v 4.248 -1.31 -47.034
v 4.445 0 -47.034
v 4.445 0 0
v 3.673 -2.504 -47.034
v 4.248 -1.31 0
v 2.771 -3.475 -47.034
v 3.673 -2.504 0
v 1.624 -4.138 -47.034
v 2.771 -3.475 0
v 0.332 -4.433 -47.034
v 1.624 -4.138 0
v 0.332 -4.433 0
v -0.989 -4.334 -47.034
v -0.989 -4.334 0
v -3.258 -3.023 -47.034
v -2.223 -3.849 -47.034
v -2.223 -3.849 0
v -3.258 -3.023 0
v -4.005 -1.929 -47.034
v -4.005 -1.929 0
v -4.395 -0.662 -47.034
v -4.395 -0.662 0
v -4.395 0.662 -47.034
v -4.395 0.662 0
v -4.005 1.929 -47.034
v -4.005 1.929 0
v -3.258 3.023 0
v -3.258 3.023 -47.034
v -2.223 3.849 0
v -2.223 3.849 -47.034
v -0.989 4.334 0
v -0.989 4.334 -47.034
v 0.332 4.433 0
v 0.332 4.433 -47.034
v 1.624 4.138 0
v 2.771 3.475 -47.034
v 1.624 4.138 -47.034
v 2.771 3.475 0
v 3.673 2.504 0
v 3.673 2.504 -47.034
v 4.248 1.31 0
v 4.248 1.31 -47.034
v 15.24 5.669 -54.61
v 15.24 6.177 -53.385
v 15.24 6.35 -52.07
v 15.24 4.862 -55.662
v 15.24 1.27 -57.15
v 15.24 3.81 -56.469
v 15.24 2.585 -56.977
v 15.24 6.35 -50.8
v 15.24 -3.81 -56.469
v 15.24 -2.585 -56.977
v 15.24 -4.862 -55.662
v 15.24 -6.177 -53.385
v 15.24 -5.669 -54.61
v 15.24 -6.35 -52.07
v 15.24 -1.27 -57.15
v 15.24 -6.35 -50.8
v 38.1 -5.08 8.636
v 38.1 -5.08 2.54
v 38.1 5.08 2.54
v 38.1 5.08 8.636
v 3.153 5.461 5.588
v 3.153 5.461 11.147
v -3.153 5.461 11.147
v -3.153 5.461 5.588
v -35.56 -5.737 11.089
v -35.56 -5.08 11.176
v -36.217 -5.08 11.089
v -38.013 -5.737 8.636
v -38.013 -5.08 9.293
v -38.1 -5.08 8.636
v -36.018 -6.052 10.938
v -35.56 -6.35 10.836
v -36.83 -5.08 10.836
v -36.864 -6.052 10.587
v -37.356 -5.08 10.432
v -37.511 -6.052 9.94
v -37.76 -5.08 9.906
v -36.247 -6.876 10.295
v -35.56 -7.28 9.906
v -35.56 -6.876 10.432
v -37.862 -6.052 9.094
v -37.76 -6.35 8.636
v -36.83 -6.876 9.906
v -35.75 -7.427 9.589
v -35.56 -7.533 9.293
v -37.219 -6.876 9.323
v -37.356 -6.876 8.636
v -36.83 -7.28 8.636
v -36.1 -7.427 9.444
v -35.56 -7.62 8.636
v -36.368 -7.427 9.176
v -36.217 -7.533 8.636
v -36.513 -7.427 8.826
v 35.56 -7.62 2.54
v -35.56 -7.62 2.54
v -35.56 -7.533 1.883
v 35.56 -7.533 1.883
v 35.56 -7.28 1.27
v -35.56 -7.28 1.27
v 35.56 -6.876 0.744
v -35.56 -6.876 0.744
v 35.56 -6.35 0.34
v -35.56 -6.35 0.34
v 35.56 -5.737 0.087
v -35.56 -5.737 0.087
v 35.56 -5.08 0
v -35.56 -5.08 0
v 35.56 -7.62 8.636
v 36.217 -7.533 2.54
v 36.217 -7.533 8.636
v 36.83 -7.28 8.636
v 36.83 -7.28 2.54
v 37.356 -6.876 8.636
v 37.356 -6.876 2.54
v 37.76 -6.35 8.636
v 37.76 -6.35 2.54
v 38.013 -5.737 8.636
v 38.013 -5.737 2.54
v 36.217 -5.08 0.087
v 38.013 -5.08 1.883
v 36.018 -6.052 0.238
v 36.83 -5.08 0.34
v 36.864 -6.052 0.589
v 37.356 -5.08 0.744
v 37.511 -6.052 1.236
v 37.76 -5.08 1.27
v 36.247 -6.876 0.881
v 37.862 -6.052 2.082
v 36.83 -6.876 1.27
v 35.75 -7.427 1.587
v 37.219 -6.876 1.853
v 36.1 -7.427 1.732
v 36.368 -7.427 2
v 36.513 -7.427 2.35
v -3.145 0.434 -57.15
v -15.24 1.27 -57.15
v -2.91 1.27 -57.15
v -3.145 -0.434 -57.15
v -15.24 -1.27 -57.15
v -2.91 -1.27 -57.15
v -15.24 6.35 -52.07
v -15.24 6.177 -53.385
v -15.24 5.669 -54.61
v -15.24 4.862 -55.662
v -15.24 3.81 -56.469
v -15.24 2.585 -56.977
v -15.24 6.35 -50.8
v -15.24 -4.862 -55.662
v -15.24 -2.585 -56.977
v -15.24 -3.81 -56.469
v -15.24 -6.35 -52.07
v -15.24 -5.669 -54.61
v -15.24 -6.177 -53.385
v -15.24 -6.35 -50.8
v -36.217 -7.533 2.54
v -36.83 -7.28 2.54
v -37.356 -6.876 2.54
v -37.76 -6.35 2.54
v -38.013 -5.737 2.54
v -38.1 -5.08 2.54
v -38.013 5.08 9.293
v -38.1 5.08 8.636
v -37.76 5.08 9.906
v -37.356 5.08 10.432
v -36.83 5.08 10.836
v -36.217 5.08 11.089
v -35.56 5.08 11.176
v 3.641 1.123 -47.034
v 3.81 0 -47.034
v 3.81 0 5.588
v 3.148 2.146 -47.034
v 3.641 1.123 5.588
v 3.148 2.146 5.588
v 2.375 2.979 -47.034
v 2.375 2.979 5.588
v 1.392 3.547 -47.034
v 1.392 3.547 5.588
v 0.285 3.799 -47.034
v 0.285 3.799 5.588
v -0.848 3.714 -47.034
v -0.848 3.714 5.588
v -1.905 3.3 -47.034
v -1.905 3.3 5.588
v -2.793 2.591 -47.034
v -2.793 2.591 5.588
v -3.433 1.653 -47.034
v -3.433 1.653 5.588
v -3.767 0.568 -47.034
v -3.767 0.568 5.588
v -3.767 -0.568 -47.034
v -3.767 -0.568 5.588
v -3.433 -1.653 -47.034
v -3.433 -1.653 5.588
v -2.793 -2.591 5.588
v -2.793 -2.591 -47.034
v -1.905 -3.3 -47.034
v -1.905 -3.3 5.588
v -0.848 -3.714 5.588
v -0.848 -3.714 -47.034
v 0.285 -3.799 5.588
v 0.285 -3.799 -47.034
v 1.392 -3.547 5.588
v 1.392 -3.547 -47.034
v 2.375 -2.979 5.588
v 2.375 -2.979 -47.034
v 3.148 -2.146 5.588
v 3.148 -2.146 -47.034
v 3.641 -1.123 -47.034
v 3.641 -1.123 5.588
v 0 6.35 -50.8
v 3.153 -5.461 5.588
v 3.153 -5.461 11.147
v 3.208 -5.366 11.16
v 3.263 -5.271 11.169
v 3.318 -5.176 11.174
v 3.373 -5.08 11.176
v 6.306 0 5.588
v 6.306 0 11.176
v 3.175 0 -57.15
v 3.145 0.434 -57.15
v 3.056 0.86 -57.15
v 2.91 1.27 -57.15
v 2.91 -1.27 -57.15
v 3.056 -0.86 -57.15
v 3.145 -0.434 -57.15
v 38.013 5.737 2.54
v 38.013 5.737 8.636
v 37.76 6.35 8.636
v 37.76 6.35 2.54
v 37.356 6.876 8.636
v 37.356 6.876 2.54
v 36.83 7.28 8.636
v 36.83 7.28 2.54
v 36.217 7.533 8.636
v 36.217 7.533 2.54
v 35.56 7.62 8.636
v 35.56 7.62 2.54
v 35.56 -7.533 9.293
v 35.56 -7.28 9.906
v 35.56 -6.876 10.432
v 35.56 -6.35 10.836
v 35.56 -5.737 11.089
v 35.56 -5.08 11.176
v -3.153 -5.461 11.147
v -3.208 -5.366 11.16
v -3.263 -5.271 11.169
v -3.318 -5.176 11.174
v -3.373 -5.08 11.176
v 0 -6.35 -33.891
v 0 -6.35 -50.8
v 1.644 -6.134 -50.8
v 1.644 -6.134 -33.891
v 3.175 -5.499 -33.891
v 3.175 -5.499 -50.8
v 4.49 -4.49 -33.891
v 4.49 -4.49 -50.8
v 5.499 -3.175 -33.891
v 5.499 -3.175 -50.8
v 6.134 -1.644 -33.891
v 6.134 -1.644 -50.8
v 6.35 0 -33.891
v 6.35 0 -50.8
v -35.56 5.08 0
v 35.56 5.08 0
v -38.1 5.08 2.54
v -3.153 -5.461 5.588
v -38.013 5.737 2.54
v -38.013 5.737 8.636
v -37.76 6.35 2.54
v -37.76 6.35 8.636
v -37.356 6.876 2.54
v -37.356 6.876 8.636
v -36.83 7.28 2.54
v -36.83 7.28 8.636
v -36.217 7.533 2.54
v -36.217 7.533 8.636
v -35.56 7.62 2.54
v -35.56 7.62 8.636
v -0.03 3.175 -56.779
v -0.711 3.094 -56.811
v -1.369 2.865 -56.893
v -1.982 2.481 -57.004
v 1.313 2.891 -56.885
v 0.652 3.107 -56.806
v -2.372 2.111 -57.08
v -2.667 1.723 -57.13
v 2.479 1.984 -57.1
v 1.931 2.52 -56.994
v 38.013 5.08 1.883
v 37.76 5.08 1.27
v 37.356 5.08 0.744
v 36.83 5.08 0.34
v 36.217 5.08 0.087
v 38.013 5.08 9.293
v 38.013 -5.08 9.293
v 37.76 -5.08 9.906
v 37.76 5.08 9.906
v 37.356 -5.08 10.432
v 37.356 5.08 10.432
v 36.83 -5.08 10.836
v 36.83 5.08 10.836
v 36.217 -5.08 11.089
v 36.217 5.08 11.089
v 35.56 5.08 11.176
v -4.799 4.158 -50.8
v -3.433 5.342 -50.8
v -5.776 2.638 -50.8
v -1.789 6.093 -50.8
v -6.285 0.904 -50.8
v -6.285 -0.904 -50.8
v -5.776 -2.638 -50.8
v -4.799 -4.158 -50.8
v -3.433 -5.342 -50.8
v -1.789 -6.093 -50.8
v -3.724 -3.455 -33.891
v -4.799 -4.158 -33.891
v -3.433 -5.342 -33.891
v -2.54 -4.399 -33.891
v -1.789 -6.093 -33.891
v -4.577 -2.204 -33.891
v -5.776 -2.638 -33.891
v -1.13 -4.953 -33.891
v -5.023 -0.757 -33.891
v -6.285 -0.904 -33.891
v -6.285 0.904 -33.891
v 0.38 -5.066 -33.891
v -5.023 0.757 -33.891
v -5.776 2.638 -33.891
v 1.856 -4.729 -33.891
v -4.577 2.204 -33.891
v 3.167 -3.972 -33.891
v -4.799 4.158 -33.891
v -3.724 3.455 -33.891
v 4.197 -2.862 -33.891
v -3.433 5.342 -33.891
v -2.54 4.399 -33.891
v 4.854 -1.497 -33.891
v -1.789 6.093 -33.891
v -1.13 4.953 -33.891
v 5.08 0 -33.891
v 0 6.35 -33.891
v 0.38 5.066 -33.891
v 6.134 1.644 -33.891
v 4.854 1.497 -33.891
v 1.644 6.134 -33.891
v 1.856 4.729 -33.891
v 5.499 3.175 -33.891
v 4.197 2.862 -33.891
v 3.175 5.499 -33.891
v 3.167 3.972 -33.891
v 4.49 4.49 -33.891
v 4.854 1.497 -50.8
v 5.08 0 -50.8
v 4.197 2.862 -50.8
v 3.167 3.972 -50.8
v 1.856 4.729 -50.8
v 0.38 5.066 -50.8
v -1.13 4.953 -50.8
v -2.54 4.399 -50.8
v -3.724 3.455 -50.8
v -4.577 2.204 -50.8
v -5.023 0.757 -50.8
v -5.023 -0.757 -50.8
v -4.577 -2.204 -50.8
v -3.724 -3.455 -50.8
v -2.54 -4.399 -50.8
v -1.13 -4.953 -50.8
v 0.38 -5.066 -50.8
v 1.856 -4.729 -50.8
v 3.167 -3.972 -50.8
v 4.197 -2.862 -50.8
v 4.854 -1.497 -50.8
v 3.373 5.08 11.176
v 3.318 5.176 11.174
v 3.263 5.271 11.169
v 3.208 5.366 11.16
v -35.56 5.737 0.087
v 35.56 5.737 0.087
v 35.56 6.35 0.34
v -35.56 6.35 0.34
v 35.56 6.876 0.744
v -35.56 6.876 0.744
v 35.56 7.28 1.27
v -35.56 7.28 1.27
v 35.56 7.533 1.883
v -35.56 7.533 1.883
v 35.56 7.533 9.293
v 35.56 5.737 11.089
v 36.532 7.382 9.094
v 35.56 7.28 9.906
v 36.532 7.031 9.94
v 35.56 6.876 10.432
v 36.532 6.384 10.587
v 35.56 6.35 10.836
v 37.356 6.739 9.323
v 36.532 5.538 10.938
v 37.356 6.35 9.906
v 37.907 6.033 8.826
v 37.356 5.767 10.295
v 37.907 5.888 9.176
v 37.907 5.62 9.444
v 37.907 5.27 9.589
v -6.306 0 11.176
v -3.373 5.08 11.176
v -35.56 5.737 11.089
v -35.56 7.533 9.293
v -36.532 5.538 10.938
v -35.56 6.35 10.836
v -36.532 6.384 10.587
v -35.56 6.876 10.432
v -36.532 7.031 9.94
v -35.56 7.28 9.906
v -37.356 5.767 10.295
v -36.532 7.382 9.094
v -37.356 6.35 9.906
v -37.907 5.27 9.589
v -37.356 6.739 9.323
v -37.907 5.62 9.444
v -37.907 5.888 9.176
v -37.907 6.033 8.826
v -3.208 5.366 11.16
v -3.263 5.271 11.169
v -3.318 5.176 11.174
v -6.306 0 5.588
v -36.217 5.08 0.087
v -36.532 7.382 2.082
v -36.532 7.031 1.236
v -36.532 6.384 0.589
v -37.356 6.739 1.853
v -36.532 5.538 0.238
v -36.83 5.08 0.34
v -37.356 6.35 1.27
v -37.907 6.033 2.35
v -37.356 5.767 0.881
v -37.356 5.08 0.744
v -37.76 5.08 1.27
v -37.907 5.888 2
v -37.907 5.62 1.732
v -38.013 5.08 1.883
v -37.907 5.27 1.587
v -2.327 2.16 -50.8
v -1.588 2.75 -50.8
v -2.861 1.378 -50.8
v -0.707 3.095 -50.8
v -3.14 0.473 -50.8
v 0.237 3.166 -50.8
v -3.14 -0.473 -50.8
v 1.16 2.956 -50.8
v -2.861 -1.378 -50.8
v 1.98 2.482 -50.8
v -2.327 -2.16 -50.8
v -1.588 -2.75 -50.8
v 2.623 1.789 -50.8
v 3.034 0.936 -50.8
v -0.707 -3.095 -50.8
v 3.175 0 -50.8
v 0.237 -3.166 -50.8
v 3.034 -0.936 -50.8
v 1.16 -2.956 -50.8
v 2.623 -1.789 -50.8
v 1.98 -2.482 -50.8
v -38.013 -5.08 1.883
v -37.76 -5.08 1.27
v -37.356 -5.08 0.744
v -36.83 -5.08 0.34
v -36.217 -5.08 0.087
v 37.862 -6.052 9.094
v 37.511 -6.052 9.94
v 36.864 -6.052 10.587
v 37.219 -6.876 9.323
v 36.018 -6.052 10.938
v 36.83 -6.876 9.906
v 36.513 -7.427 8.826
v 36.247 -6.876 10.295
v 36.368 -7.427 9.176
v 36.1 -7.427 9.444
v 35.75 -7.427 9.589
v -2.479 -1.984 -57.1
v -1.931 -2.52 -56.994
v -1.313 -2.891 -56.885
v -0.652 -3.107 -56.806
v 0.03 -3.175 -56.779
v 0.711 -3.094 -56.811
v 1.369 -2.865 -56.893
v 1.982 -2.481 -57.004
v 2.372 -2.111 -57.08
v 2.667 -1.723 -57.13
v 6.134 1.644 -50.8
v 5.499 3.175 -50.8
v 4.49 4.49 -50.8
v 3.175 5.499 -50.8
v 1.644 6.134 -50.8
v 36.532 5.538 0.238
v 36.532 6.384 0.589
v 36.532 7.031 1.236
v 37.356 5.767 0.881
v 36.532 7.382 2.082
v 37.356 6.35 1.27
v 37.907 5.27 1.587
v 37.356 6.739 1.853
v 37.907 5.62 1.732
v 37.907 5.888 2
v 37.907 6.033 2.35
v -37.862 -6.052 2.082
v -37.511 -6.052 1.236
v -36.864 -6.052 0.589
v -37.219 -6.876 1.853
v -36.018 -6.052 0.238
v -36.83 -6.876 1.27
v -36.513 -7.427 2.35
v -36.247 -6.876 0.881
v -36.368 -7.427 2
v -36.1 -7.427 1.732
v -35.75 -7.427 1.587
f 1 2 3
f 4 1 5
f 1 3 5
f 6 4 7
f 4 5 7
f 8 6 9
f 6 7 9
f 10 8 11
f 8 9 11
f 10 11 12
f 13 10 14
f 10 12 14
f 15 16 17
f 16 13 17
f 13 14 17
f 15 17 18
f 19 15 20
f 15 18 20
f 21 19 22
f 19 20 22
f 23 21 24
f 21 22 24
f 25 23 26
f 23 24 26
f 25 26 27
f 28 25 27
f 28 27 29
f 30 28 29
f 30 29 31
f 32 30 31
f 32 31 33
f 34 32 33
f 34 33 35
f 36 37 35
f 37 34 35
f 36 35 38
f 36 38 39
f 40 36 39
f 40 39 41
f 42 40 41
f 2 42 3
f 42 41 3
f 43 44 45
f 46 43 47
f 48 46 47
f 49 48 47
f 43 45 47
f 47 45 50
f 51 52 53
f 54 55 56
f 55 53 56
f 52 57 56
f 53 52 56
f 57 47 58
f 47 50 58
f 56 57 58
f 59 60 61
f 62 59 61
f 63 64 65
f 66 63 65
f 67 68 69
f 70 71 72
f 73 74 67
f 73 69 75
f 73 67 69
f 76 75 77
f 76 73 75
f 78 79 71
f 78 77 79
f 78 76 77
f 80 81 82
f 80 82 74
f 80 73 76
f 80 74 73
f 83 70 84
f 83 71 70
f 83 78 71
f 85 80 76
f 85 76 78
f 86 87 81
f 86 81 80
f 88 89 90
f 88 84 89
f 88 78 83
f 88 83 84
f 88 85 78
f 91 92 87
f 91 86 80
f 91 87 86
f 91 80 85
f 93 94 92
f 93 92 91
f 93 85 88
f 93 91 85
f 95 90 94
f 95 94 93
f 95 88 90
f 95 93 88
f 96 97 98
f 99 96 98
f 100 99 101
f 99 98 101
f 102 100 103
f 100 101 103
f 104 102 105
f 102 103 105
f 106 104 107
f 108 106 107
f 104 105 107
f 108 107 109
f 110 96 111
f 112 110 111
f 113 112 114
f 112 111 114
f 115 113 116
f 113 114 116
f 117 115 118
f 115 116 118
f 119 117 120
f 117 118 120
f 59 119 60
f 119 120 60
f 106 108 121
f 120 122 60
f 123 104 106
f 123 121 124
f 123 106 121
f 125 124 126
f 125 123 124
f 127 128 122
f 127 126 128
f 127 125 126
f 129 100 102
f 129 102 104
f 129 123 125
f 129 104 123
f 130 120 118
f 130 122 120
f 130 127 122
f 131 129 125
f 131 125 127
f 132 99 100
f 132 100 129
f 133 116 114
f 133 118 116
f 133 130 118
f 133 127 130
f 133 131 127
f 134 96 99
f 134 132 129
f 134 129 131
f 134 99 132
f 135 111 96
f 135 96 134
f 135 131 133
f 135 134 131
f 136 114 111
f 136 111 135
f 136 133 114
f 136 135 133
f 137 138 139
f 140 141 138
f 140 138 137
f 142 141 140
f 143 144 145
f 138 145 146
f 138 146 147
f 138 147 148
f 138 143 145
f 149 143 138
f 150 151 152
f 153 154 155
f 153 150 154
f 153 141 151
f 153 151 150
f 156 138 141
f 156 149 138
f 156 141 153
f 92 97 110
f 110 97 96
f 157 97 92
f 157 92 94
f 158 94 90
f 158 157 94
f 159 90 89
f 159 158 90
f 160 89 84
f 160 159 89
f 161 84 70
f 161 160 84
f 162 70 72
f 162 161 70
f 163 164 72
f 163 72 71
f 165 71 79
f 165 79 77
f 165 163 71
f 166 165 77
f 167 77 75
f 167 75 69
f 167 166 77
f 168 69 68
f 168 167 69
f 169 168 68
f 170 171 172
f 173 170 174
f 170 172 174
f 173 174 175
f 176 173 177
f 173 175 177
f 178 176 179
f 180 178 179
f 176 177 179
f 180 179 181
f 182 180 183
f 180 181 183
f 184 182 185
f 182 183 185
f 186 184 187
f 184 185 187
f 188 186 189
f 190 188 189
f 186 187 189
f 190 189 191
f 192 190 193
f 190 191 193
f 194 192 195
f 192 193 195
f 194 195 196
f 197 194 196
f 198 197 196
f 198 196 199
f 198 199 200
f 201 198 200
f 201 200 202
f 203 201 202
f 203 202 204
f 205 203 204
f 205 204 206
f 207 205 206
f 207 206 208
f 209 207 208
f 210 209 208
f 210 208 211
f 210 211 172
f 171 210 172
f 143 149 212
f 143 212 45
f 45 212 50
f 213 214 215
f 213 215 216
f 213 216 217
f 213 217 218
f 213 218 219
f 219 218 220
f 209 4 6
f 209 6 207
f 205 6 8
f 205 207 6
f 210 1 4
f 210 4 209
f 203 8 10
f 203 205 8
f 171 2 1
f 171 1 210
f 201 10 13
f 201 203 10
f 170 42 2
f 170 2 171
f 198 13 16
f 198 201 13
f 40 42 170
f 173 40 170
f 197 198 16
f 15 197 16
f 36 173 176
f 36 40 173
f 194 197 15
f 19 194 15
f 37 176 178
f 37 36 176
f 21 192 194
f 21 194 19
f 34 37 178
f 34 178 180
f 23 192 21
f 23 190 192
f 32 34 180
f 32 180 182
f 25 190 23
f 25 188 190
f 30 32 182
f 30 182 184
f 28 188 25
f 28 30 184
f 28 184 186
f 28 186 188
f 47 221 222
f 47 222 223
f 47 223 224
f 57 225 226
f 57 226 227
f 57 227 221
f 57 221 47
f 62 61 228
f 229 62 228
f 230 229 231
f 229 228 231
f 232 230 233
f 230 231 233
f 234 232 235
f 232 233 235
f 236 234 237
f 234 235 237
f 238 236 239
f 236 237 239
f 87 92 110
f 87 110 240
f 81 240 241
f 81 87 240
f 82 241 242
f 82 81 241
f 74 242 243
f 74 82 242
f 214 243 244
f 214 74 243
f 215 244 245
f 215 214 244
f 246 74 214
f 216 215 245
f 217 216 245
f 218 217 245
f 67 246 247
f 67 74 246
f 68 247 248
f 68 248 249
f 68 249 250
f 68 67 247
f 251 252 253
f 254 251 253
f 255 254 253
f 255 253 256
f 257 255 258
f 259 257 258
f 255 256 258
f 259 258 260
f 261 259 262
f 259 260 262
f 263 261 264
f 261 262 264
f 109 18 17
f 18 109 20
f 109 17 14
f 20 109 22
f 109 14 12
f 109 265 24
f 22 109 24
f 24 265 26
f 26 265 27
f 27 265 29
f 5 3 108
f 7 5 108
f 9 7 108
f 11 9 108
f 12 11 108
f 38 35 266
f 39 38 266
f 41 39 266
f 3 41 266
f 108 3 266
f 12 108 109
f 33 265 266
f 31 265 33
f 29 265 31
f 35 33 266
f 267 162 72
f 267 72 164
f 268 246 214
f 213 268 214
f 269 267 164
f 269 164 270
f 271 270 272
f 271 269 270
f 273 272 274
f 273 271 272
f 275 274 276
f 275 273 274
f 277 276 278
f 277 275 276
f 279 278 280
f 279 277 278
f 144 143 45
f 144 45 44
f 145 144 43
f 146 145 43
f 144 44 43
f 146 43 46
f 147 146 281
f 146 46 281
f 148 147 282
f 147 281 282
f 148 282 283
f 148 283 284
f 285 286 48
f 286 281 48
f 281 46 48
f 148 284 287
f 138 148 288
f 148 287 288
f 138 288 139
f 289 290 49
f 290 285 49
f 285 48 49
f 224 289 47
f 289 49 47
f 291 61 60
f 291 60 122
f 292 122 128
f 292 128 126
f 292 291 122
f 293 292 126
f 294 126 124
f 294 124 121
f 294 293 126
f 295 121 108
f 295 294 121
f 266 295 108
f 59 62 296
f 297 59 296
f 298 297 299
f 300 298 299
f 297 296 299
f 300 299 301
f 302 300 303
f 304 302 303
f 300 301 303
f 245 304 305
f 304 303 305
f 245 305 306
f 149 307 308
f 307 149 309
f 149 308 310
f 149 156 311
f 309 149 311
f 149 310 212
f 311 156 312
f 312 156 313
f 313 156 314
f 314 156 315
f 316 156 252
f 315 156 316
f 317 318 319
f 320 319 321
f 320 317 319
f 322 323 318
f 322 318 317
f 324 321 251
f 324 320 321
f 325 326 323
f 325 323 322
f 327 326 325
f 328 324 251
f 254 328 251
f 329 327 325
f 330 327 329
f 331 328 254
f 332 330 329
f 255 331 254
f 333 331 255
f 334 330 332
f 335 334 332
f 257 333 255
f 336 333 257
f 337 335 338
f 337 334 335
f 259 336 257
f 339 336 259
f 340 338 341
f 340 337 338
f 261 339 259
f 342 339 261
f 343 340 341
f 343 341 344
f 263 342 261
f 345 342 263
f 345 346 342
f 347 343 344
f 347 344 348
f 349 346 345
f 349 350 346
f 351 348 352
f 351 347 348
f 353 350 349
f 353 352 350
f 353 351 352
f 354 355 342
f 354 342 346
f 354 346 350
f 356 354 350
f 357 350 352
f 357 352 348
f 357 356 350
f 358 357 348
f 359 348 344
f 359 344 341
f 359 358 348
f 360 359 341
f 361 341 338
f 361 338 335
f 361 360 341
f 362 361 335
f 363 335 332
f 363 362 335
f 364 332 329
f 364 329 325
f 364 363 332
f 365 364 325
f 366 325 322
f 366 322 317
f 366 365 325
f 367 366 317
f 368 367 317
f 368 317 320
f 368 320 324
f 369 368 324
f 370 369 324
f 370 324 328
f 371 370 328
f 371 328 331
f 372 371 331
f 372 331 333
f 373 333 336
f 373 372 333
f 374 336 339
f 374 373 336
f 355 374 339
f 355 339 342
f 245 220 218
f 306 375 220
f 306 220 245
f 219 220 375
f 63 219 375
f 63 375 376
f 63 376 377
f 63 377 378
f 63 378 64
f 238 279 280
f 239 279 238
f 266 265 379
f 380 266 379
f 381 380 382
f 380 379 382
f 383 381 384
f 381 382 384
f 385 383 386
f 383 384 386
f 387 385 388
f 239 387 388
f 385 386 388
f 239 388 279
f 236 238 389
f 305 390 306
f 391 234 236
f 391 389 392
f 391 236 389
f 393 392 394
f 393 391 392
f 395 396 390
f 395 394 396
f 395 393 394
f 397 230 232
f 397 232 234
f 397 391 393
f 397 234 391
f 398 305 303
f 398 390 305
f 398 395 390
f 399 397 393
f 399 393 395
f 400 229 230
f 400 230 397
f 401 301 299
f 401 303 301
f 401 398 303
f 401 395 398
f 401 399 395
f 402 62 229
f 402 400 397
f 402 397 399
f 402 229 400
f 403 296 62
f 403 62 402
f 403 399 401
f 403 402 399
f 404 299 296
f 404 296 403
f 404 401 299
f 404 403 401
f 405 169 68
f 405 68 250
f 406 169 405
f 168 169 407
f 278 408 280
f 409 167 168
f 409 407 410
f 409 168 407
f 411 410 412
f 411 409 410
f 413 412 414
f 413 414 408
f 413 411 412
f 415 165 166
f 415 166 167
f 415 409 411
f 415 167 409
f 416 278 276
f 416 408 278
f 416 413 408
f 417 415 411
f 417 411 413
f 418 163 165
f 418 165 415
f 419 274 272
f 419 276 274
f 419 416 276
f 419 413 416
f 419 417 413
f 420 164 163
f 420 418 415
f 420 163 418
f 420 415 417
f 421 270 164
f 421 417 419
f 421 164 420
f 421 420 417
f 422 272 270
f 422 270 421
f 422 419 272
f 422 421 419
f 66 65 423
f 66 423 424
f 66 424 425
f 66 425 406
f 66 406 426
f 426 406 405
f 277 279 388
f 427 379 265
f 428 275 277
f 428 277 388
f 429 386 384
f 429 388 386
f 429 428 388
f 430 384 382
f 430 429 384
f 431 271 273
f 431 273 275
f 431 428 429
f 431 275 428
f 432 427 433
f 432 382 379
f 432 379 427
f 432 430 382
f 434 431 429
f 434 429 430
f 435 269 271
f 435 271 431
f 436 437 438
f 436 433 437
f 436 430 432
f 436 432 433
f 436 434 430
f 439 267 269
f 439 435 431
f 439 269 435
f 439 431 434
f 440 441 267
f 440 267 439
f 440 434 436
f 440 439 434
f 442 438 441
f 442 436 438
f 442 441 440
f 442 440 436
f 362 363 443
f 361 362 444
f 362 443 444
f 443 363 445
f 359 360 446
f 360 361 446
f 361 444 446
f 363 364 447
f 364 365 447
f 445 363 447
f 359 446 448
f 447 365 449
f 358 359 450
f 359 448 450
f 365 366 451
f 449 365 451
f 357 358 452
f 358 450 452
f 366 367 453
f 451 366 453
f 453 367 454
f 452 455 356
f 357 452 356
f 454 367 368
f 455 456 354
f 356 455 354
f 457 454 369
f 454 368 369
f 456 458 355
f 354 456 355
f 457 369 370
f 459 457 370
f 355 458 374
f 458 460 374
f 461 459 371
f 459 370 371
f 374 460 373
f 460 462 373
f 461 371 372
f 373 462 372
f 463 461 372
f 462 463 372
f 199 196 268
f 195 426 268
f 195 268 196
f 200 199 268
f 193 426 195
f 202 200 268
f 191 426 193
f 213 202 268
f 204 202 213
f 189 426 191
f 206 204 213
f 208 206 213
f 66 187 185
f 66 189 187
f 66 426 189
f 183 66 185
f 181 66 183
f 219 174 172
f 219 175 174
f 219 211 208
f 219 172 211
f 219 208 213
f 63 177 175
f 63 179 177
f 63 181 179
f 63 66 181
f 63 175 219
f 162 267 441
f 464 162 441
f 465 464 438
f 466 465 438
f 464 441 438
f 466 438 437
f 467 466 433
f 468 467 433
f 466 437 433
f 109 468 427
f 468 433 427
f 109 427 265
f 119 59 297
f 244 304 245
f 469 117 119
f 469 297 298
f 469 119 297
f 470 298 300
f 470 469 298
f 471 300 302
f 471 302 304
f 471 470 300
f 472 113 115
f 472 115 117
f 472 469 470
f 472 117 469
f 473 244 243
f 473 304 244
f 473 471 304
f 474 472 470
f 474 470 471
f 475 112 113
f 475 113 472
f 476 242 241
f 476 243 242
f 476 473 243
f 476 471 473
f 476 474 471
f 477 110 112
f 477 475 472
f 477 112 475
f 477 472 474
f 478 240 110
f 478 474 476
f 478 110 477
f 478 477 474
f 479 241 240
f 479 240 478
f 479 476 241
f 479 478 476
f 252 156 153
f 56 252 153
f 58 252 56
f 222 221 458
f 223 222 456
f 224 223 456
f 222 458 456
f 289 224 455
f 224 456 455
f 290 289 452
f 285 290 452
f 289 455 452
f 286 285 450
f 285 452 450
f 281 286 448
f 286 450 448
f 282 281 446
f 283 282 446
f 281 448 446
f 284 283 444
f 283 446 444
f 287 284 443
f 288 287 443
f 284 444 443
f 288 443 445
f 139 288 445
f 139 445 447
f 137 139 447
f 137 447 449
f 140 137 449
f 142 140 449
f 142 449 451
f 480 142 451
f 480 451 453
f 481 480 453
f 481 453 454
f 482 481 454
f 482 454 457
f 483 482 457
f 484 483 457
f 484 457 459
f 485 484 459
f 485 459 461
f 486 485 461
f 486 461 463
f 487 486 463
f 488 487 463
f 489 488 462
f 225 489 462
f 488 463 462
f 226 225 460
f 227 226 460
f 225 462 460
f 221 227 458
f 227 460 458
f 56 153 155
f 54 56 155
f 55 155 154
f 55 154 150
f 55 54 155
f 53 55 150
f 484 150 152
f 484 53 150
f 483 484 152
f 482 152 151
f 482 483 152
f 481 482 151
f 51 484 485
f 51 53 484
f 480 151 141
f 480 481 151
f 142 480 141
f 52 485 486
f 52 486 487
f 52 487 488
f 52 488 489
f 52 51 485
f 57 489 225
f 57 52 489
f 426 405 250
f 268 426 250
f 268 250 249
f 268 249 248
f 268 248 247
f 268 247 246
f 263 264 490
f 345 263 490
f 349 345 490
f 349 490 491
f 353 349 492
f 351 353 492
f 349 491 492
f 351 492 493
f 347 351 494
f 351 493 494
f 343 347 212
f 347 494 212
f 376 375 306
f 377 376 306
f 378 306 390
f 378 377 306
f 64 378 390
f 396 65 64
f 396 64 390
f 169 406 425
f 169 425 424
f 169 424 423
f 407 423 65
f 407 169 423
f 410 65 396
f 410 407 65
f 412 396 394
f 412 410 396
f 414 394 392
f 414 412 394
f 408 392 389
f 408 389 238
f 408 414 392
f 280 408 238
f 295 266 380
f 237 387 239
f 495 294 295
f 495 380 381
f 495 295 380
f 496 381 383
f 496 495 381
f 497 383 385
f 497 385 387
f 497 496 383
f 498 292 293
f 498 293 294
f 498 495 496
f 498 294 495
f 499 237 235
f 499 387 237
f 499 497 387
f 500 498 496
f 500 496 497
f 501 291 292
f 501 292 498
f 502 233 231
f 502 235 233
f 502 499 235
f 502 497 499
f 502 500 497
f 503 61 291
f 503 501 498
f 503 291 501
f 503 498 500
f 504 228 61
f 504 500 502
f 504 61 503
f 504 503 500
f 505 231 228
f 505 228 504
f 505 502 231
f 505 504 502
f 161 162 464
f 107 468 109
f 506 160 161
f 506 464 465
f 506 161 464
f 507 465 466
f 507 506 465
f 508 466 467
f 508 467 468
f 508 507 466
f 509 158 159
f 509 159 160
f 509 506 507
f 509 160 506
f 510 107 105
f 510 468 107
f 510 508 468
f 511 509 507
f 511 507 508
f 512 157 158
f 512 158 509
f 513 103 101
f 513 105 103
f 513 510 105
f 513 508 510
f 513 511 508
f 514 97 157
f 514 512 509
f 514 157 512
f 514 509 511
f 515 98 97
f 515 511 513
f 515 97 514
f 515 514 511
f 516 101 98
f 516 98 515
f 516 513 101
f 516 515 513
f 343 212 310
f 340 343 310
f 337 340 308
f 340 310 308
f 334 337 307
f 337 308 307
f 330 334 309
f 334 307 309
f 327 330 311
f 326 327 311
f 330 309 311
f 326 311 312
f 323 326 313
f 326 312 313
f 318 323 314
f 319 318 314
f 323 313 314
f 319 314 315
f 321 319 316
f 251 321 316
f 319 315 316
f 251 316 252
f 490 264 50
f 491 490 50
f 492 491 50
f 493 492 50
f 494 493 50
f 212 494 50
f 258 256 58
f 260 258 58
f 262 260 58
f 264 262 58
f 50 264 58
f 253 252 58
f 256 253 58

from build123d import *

# Parameters (mm, degrees)
F0_W         = 76.2
F0_H         = 15.24
F1_DEPTH     = 11.176
F4_DEPTH     = 5.588
F5_R         = 3.175
F6_DEPTH     = 11.176
F7_T1_DEPTH  = 6.096
F7_T3_DEPTH  = 10.16
F7_T5_DEPTH  = 71.12
F7_S9_W      = 2.54
F7_S9_H      = 2.54
F7_T10_DEPTH = 2.54
F7_S15_W     = 2.54
F7_S15_H     = 2.54
F7_T16_DEPTH = 2.54
F7_S21_W     = 2.54
F7_S21_H     = 2.54
F7_T22_DEPTH = 2.54
F7_S27_W     = 2.54
F7_S27_H     = 2.54
F7_T28_DEPTH = 2.54
F7_S33_W     = 2.54
F7_S33_H     = 2.54
F7_T34_DEPTH = 2.54
F7_S39_W     = 2.54
F7_S39_H     = 2.54
F7_T40_DEPTH = 2.54
F7_S45_W     = 2.54
F7_S45_H     = 2.54
F7_T46_DEPTH = 2.54
F7_S51_W     = 2.54
F7_S51_H     = 2.54
F7_T52_DEPTH = 2.54
F8_R         = 4.445
F9_DEPTH     = 50.8
F10_R        = 3.175
F11_DEPTH    = 61.976
F12_W        = 30.48
F12_H        = 12.7
F13_DEPTH    = 6.35
F14_R        = 5.08
F15_R        = 3.175
F16_DEPTH    = 71.6058239341
F17_W        = 9.715013206
F17_H        = 3.7662244022
F18_DEPTH    = 16.9285498559
F20_R        = 5.08
F21_DEPTH    = 16.9094242156
F22_R        = 3.81
F23_DEPTH    = 111.593618989


# Not quite as in the source:
# - a fillet or chamfer that OpenCascade refuses, or shapes differently, is made with other operations: its cross-section is extruded or revolved along the edge and cut away or added


with BuildPart() as f1:
    # F0 (on Top) → F1 (new body)
    with BuildSketch(Plane.XY):
        Rectangle(F0_W, F0_H)
    extrude(amount=F1_DEPTH)

    # F3 (on face) → F4 (cut)
    with BuildSketch(Plane.XY.offset(11.176)):
        Polygon((-3.15290982, -5.461), (3.15290982, -5.461), (6.3058196401, 0), (3.15290982, 5.461), (-3.15290982, 5.461), (-6.3058196401, 0), align=None)
    extrude(amount=-F4_DEPTH, mode=Mode.SUBTRACT)

    # F5 (on face) → F6 (cut)
    with BuildSketch(Plane.XY.offset(11.176)):
        Circle(F5_R)
    extrude(amount=-F6_DEPTH, mode=Mode.SUBTRACT)

    # F7: fillet of radius 2.54 on 12 edges, made by hand

    # F7_s2 → F7_t1 (cut)
    with BuildSketch(Plane.XY.offset(2.54)):
        with BuildLine():
            ThreePointArc((-35.56, -7.62), (-37.3560512242, -6.8760512242), (-38.1, -5.08))
            Line((-38.1, -5.08), (-38.1, -7.62))
            Line((-38.1, -7.62), (-35.56, -7.62))
        make_face()
        with BuildLine():
            ThreePointArc((-38.1, 5.08), (-37.3560512242, 6.8760512242), (-35.56, 7.62))
            Line((-35.56, 7.62), (-38.1, 7.62))
            Line((-38.1, 7.62), (-38.1, 5.08))
        make_face()
        with BuildLine():
            ThreePointArc((38.1, 5.08), (37.3560512242, 6.8760512242), (35.56, 7.62))
            Line((35.56, 7.62), (38.1, 7.62))
            Line((38.1, 7.62), (38.1, 5.08))
        make_face()
        with BuildLine():
            ThreePointArc((35.56, -7.62), (37.3560512242, -6.8760512242), (38.1, -5.08))
            Line((38.1, -5.08), (38.1, -7.62))
            Line((38.1, -7.62), (35.56, -7.62))
        make_face()
    extrude(amount=F7_T1_DEPTH, mode=Mode.SUBTRACT)

    # F7_s4 → F7_t3 (cut)
    with BuildSketch(Plane.XZ.offset(-5.08)):
        with BuildLine():
            ThreePointArc((38.1, 2.54), (37.3560512242, 0.7439487758), (35.56, 0))
            Line((35.56, 0), (38.1, 0))
            Line((38.1, 0), (38.1, 2.54))
        make_face()
        with BuildLine():
            ThreePointArc((-38.1, 8.636), (-37.3560512242, 10.4320512242), (-35.56, 11.176))
            Line((-35.56, 11.176), (-38.1, 11.176))
            Line((-38.1, 11.176), (-38.1, 8.636))
        make_face()
        with BuildLine():
            ThreePointArc((-38.1, 2.54), (-37.3560512242, 0.7439487758), (-35.56, 0))
            Line((-35.56, 0), (-38.1, 0))
            Line((-38.1, 0), (-38.1, 2.54))
        make_face()
        with BuildLine():
            ThreePointArc((38.1, 8.636), (37.3560512242, 10.4320512242), (35.56, 11.176))
            Line((35.56, 11.176), (38.1, 11.176))
            Line((38.1, 11.176), (38.1, 8.636))
        make_face()
    extrude(amount=F7_T3_DEPTH, mode=Mode.SUBTRACT)

    # F7_s6 → F7_t5 (cut)
    with BuildSketch(Plane.YZ.offset(-35.56)):
        with BuildLine():
            ThreePointArc((5.08, 11.176), (6.8760512242, 10.4320512242), (7.62, 8.636))
            Line((7.62, 8.636), (7.62, 11.176))
            Line((7.62, 11.176), (5.08, 11.176))
        make_face()
        with BuildLine():
            ThreePointArc((5.08, 0), (6.8760512242, 0.7439487758), (7.62, 2.54))
            Line((7.62, 2.54), (7.62, 0))
            Line((7.62, 0), (5.08, 0))
        make_face()
        with BuildLine():
            ThreePointArc((-7.62, 2.54), (-6.8760512242, 0.7439487758), (-5.08, 0))
            Line((-5.08, 0), (-7.62, 0))
            Line((-7.62, 0), (-7.62, 2.54))
        make_face()
        with BuildLine():
            ThreePointArc((-7.62, 8.636), (-6.8760512242, 10.4320512242), (-5.08, 11.176))
            Line((-5.08, 11.176), (-7.62, 11.176))
            Line((-7.62, 11.176), (-7.62, 8.636))
        make_face()
    extrude(amount=F7_T5_DEPTH, mode=Mode.SUBTRACT)


with BuildPart() as f7_tool8:
    # F7_s9 → F7_t10 (new body)
    with BuildSketch(Plane.XZ.offset(5.08)):
        with Locations((-36.83, 1.27)):
            Rectangle(F7_S9_W, F7_S9_H)
    extrude(amount=F7_T10_DEPTH)

    # F7_s11 → F7_t12 (revolve, cut)
    with BuildSketch(Plane(origin=(-35.56, -5.08, 2.54), x_dir=(0.7071067812, 0, 0.7071067812), z_dir=(0.7071067812, 0, -0.7071067812))):
        with BuildLine():
            ThreePointArc((0, -2.54), (2.54, 0), (0, 2.54))
            Line((0, 2.54), (0, -2.54))
        make_face()
    revolve(axis=Axis((-35.56, -5.08, 2.54), (0, -1, 0)), mode=Mode.SUBTRACT)


with BuildPart() as f1_1:
    add(f1.part)

    # F7_t7: cut F7_tool8
    add(f7_tool8.part, mode=Mode.SUBTRACT)


with BuildPart() as f7_tool14:
    # F7_s15 → F7_t16 (new body)
    with BuildSketch(Plane.XZ.offset(5.08)):
        with Locations((-36.83, 9.906)):
            Rectangle(F7_S15_W, F7_S15_H)
    extrude(amount=F7_T16_DEPTH)

    # F7_s17 → F7_t18 (revolve, cut)
    with BuildSketch(Plane(origin=(-35.56, -5.08, 8.636), x_dir=(0.7071067812, 0, -0.7071067812), z_dir=(-0.7071067812, 0, -0.7071067812))):
        with BuildLine():
            ThreePointArc((0, -2.54), (2.54, 0), (0, 2.54))
            Line((0, 2.54), (0, -2.54))
        make_face()
    revolve(axis=Axis((-35.56, -5.08, 8.636), (0, -1, 0)), mode=Mode.SUBTRACT)


with BuildPart() as f1_2:
    add(f1_1.part)

    # F7_t13: cut F7_tool14
    add(f7_tool14.part, mode=Mode.SUBTRACT)


with BuildPart() as f7_tool20:
    # F7_s21 → F7_t22 (new body)
    with BuildSketch(Plane.YZ.offset(-35.56)):
        with Locations((6.35, 1.27)):
            Rectangle(F7_S21_W, F7_S21_H)
    extrude(amount=-F7_T22_DEPTH)

    # F7_s23 → F7_t24 (revolve, cut)
    with BuildSketch(Plane(origin=(-35.56, 5.08, 2.54), x_dir=(0, -0.7071067812, 0.7071067812), z_dir=(0, -0.7071067812, -0.7071067812))):
        with BuildLine():
            ThreePointArc((0, -2.54), (2.54, 0), (0, 2.54))
            Line((0, 2.54), (0, -2.54))
        make_face()
    revolve(axis=Axis((-35.56, 5.08, 2.54), (-1, 0, 0)), mode=Mode.SUBTRACT)


with BuildPart() as f1_3:
    add(f1_2.part)

    # F7_t19: cut F7_tool20
    add(f7_tool20.part, mode=Mode.SUBTRACT)


with BuildPart() as f7_tool26:
    # F7_s27 → F7_t28 (new body)
    with BuildSketch(Plane.YZ.offset(-35.56)):
        with Locations((6.35, 9.906)):
            Rectangle(F7_S27_W, F7_S27_H)
    extrude(amount=-F7_T28_DEPTH)

    # F7_s29 → F7_t30 (revolve, cut)
    with BuildSketch(Plane(origin=(-35.56, 5.08, 8.636), x_dir=(0, -0.7071067812, -0.7071067812), z_dir=(0, 0.7071067812, -0.7071067812))):
        with BuildLine():
            ThreePointArc((0, -2.54), (2.54, 0), (0, 2.54))
            Line((0, 2.54), (0, -2.54))
        make_face()
    revolve(axis=Axis((-35.56, 5.08, 8.636), (-1, 0, 0)), mode=Mode.SUBTRACT)


with BuildPart() as f1_4:
    add(f1_3.part)

    # F7_t25: cut F7_tool26
    add(f7_tool26.part, mode=Mode.SUBTRACT)


with BuildPart() as f7_tool32:
    # F7_s33 → F7_t34 (new body)
    with BuildSketch(Plane.XZ.offset(5.08)):
        with Locations((36.83, 1.27)):
            Rectangle(F7_S33_W, F7_S33_H)
    extrude(amount=F7_T34_DEPTH)

    # F7_s35 → F7_t36 (revolve, cut)
    with BuildSketch(Plane(origin=(35.56, -5.08, 2.54), x_dir=(-0.7071067812, 0, 0.7071067812), z_dir=(0.7071067812, 0, 0.7071067812))):
        with BuildLine():
            ThreePointArc((0, -2.54), (2.54, 0), (0, 2.54))
            Line((0, 2.54), (0, -2.54))
        make_face()
    revolve(axis=Axis((35.56, -5.08, 2.54), (0, -1, 0)), mode=Mode.SUBTRACT)


with BuildPart() as f1_5:
    add(f1_4.part)

    # F7_t31: cut F7_tool32
    add(f7_tool32.part, mode=Mode.SUBTRACT)


with BuildPart() as f7_tool38:
    # F7_s39 → F7_t40 (new body)
    with BuildSketch(Plane.YZ.offset(35.56)):
        with Locations((6.35, 1.27)):
            Rectangle(F7_S39_W, F7_S39_H)
    extrude(amount=F7_T40_DEPTH)

    # F7_s41 → F7_t42 (revolve, cut)
    with BuildSketch(Plane(origin=(35.56, 5.08, 2.54), x_dir=(0, -0.7071067812, 0.7071067812), z_dir=(0, 0.7071067812, 0.7071067812))):
        with BuildLine():
            ThreePointArc((0, -2.54), (2.54, 0), (0, 2.54))
            Line((0, 2.54), (0, -2.54))
        make_face()
    revolve(axis=Axis((35.56, 5.08, 2.54), (1, 0, 0)), mode=Mode.SUBTRACT)


with BuildPart() as f1_6:
    add(f1_5.part)

    # F7_t37: cut F7_tool38
    add(f7_tool38.part, mode=Mode.SUBTRACT)


with BuildPart() as f7_tool44:
    # F7_s45 → F7_t46 (new body)
    with BuildSketch(Plane.YZ.offset(35.56)):
        with Locations((6.35, 9.906)):
            Rectangle(F7_S45_W, F7_S45_H)
    extrude(amount=F7_T46_DEPTH)

    # F7_s47 → F7_t48 (revolve, cut)
    with BuildSketch(Plane(origin=(35.56, 5.08, 8.636), x_dir=(0, -0.7071067812, -0.7071067812), z_dir=(0, -0.7071067812, 0.7071067812))):
        with BuildLine():
            ThreePointArc((0, -2.54), (2.54, 0), (0, 2.54))
            Line((0, 2.54), (0, -2.54))
        make_face()
    revolve(axis=Axis((35.56, 5.08, 8.636), (1, 0, 0)), mode=Mode.SUBTRACT)


with BuildPart() as f1_7:
    add(f1_6.part)

    # F7_t43: cut F7_tool44
    add(f7_tool44.part, mode=Mode.SUBTRACT)


with BuildPart() as f7_tool50:
    # F7_s51 → F7_t52 (new body)
    with BuildSketch(Plane.XZ.offset(5.08)):
        with Locations((36.83, 9.906)):
            Rectangle(F7_S51_W, F7_S51_H)
    extrude(amount=F7_T52_DEPTH)

    # F7_s53 → F7_t54 (revolve, cut)
    with BuildSketch(Plane(origin=(35.56, -5.08, 8.636), x_dir=(-0.7071067812, 0, -0.7071067812), z_dir=(-0.7071067812, 0, 0.7071067812))):
        with BuildLine():
            ThreePointArc((0, -2.54), (2.54, 0), (0, 2.54))
            Line((0, 2.54), (0, -2.54))
        make_face()
    revolve(axis=Axis((35.56, -5.08, 8.636), (0, -1, 0)), mode=Mode.SUBTRACT)


with BuildPart() as f1_8:
    add(f1_7.part)

    # F7_t49: cut F7_tool50
    add(f7_tool50.part, mode=Mode.SUBTRACT)

    # F8 (on face) → F9 (join)
    with BuildSketch(Plane(origin=(0, 0, 0), x_dir=(1, 0, 0), z_dir=(0, 0, -1))):
        Circle(F8_R)
    extrude(amount=F9_DEPTH)

    # F10 (on face) → F11 (cut)
    with BuildSketch(Plane.XY.offset(11.176)):
        Circle(F10_R)
    extrude(amount=-F11_DEPTH, mode=Mode.SUBTRACT)

    # F17 (on face) → F18 (cut)
    with BuildSketch(Plane(origin=(0, 6.35, 0), x_dir=(-1, 0, 0), z_dir=(0, 1, 0))):
        with Locations((0.1505874097, -48.9168877989)):
            Rectangle(F17_W, F17_H)
    extrude(amount=-F18_DEPTH, mode=Mode.SUBTRACT)

    # F22 (on face) → F23 (cut)
    with BuildSketch(Plane.XY.offset(11.176)):
        Circle(F22_R)
    extrude(amount=-F23_DEPTH, mode=Mode.SUBTRACT)


with BuildPart() as f13:
    # F12 (on face) → F13 (new body)
    with BuildSketch(Plane(origin=(0, 0, -50.8), x_dir=(1, 0, 0), z_dir=(0, 0, -1))):
        Rectangle(F12_W, F12_H)
    extrude(amount=F13_DEPTH)

    # F14
    f14_edges = [f13.edges().sort_by_distance(p)[0] for p in [
        (0, -6.35, -57.15),
        (0, 6.35, -57.15),
    ]]
    fillet(f14_edges, radius=F14_R)

    # F15 (on face) → F16 (cut)
    with BuildSketch(Plane.XY.offset(11.176)):
        Circle(F15_R)
    extrude(amount=-F16_DEPTH, mode=Mode.SUBTRACT)

    # F20 (on face) → F21 (join)
    with BuildSketch(Plane.XY.offset(-50.8)):
        with BuildLine():
            ThreePointArc((0, -6.35), (4.4901280605, -4.4901280605), (6.35, 0))
            ThreePointArc((6.35, 0), (4.4901280605, 4.4901280605), (0, 6.35))
            ThreePointArc((0, 6.35), (-6.35, 0), (0, -6.35))
        make_face()
        Circle(F20_R, mode=Mode.SUBTRACT)
    extrude(amount=F21_DEPTH)


solid = Compound([f1_8.part, f13.part])
